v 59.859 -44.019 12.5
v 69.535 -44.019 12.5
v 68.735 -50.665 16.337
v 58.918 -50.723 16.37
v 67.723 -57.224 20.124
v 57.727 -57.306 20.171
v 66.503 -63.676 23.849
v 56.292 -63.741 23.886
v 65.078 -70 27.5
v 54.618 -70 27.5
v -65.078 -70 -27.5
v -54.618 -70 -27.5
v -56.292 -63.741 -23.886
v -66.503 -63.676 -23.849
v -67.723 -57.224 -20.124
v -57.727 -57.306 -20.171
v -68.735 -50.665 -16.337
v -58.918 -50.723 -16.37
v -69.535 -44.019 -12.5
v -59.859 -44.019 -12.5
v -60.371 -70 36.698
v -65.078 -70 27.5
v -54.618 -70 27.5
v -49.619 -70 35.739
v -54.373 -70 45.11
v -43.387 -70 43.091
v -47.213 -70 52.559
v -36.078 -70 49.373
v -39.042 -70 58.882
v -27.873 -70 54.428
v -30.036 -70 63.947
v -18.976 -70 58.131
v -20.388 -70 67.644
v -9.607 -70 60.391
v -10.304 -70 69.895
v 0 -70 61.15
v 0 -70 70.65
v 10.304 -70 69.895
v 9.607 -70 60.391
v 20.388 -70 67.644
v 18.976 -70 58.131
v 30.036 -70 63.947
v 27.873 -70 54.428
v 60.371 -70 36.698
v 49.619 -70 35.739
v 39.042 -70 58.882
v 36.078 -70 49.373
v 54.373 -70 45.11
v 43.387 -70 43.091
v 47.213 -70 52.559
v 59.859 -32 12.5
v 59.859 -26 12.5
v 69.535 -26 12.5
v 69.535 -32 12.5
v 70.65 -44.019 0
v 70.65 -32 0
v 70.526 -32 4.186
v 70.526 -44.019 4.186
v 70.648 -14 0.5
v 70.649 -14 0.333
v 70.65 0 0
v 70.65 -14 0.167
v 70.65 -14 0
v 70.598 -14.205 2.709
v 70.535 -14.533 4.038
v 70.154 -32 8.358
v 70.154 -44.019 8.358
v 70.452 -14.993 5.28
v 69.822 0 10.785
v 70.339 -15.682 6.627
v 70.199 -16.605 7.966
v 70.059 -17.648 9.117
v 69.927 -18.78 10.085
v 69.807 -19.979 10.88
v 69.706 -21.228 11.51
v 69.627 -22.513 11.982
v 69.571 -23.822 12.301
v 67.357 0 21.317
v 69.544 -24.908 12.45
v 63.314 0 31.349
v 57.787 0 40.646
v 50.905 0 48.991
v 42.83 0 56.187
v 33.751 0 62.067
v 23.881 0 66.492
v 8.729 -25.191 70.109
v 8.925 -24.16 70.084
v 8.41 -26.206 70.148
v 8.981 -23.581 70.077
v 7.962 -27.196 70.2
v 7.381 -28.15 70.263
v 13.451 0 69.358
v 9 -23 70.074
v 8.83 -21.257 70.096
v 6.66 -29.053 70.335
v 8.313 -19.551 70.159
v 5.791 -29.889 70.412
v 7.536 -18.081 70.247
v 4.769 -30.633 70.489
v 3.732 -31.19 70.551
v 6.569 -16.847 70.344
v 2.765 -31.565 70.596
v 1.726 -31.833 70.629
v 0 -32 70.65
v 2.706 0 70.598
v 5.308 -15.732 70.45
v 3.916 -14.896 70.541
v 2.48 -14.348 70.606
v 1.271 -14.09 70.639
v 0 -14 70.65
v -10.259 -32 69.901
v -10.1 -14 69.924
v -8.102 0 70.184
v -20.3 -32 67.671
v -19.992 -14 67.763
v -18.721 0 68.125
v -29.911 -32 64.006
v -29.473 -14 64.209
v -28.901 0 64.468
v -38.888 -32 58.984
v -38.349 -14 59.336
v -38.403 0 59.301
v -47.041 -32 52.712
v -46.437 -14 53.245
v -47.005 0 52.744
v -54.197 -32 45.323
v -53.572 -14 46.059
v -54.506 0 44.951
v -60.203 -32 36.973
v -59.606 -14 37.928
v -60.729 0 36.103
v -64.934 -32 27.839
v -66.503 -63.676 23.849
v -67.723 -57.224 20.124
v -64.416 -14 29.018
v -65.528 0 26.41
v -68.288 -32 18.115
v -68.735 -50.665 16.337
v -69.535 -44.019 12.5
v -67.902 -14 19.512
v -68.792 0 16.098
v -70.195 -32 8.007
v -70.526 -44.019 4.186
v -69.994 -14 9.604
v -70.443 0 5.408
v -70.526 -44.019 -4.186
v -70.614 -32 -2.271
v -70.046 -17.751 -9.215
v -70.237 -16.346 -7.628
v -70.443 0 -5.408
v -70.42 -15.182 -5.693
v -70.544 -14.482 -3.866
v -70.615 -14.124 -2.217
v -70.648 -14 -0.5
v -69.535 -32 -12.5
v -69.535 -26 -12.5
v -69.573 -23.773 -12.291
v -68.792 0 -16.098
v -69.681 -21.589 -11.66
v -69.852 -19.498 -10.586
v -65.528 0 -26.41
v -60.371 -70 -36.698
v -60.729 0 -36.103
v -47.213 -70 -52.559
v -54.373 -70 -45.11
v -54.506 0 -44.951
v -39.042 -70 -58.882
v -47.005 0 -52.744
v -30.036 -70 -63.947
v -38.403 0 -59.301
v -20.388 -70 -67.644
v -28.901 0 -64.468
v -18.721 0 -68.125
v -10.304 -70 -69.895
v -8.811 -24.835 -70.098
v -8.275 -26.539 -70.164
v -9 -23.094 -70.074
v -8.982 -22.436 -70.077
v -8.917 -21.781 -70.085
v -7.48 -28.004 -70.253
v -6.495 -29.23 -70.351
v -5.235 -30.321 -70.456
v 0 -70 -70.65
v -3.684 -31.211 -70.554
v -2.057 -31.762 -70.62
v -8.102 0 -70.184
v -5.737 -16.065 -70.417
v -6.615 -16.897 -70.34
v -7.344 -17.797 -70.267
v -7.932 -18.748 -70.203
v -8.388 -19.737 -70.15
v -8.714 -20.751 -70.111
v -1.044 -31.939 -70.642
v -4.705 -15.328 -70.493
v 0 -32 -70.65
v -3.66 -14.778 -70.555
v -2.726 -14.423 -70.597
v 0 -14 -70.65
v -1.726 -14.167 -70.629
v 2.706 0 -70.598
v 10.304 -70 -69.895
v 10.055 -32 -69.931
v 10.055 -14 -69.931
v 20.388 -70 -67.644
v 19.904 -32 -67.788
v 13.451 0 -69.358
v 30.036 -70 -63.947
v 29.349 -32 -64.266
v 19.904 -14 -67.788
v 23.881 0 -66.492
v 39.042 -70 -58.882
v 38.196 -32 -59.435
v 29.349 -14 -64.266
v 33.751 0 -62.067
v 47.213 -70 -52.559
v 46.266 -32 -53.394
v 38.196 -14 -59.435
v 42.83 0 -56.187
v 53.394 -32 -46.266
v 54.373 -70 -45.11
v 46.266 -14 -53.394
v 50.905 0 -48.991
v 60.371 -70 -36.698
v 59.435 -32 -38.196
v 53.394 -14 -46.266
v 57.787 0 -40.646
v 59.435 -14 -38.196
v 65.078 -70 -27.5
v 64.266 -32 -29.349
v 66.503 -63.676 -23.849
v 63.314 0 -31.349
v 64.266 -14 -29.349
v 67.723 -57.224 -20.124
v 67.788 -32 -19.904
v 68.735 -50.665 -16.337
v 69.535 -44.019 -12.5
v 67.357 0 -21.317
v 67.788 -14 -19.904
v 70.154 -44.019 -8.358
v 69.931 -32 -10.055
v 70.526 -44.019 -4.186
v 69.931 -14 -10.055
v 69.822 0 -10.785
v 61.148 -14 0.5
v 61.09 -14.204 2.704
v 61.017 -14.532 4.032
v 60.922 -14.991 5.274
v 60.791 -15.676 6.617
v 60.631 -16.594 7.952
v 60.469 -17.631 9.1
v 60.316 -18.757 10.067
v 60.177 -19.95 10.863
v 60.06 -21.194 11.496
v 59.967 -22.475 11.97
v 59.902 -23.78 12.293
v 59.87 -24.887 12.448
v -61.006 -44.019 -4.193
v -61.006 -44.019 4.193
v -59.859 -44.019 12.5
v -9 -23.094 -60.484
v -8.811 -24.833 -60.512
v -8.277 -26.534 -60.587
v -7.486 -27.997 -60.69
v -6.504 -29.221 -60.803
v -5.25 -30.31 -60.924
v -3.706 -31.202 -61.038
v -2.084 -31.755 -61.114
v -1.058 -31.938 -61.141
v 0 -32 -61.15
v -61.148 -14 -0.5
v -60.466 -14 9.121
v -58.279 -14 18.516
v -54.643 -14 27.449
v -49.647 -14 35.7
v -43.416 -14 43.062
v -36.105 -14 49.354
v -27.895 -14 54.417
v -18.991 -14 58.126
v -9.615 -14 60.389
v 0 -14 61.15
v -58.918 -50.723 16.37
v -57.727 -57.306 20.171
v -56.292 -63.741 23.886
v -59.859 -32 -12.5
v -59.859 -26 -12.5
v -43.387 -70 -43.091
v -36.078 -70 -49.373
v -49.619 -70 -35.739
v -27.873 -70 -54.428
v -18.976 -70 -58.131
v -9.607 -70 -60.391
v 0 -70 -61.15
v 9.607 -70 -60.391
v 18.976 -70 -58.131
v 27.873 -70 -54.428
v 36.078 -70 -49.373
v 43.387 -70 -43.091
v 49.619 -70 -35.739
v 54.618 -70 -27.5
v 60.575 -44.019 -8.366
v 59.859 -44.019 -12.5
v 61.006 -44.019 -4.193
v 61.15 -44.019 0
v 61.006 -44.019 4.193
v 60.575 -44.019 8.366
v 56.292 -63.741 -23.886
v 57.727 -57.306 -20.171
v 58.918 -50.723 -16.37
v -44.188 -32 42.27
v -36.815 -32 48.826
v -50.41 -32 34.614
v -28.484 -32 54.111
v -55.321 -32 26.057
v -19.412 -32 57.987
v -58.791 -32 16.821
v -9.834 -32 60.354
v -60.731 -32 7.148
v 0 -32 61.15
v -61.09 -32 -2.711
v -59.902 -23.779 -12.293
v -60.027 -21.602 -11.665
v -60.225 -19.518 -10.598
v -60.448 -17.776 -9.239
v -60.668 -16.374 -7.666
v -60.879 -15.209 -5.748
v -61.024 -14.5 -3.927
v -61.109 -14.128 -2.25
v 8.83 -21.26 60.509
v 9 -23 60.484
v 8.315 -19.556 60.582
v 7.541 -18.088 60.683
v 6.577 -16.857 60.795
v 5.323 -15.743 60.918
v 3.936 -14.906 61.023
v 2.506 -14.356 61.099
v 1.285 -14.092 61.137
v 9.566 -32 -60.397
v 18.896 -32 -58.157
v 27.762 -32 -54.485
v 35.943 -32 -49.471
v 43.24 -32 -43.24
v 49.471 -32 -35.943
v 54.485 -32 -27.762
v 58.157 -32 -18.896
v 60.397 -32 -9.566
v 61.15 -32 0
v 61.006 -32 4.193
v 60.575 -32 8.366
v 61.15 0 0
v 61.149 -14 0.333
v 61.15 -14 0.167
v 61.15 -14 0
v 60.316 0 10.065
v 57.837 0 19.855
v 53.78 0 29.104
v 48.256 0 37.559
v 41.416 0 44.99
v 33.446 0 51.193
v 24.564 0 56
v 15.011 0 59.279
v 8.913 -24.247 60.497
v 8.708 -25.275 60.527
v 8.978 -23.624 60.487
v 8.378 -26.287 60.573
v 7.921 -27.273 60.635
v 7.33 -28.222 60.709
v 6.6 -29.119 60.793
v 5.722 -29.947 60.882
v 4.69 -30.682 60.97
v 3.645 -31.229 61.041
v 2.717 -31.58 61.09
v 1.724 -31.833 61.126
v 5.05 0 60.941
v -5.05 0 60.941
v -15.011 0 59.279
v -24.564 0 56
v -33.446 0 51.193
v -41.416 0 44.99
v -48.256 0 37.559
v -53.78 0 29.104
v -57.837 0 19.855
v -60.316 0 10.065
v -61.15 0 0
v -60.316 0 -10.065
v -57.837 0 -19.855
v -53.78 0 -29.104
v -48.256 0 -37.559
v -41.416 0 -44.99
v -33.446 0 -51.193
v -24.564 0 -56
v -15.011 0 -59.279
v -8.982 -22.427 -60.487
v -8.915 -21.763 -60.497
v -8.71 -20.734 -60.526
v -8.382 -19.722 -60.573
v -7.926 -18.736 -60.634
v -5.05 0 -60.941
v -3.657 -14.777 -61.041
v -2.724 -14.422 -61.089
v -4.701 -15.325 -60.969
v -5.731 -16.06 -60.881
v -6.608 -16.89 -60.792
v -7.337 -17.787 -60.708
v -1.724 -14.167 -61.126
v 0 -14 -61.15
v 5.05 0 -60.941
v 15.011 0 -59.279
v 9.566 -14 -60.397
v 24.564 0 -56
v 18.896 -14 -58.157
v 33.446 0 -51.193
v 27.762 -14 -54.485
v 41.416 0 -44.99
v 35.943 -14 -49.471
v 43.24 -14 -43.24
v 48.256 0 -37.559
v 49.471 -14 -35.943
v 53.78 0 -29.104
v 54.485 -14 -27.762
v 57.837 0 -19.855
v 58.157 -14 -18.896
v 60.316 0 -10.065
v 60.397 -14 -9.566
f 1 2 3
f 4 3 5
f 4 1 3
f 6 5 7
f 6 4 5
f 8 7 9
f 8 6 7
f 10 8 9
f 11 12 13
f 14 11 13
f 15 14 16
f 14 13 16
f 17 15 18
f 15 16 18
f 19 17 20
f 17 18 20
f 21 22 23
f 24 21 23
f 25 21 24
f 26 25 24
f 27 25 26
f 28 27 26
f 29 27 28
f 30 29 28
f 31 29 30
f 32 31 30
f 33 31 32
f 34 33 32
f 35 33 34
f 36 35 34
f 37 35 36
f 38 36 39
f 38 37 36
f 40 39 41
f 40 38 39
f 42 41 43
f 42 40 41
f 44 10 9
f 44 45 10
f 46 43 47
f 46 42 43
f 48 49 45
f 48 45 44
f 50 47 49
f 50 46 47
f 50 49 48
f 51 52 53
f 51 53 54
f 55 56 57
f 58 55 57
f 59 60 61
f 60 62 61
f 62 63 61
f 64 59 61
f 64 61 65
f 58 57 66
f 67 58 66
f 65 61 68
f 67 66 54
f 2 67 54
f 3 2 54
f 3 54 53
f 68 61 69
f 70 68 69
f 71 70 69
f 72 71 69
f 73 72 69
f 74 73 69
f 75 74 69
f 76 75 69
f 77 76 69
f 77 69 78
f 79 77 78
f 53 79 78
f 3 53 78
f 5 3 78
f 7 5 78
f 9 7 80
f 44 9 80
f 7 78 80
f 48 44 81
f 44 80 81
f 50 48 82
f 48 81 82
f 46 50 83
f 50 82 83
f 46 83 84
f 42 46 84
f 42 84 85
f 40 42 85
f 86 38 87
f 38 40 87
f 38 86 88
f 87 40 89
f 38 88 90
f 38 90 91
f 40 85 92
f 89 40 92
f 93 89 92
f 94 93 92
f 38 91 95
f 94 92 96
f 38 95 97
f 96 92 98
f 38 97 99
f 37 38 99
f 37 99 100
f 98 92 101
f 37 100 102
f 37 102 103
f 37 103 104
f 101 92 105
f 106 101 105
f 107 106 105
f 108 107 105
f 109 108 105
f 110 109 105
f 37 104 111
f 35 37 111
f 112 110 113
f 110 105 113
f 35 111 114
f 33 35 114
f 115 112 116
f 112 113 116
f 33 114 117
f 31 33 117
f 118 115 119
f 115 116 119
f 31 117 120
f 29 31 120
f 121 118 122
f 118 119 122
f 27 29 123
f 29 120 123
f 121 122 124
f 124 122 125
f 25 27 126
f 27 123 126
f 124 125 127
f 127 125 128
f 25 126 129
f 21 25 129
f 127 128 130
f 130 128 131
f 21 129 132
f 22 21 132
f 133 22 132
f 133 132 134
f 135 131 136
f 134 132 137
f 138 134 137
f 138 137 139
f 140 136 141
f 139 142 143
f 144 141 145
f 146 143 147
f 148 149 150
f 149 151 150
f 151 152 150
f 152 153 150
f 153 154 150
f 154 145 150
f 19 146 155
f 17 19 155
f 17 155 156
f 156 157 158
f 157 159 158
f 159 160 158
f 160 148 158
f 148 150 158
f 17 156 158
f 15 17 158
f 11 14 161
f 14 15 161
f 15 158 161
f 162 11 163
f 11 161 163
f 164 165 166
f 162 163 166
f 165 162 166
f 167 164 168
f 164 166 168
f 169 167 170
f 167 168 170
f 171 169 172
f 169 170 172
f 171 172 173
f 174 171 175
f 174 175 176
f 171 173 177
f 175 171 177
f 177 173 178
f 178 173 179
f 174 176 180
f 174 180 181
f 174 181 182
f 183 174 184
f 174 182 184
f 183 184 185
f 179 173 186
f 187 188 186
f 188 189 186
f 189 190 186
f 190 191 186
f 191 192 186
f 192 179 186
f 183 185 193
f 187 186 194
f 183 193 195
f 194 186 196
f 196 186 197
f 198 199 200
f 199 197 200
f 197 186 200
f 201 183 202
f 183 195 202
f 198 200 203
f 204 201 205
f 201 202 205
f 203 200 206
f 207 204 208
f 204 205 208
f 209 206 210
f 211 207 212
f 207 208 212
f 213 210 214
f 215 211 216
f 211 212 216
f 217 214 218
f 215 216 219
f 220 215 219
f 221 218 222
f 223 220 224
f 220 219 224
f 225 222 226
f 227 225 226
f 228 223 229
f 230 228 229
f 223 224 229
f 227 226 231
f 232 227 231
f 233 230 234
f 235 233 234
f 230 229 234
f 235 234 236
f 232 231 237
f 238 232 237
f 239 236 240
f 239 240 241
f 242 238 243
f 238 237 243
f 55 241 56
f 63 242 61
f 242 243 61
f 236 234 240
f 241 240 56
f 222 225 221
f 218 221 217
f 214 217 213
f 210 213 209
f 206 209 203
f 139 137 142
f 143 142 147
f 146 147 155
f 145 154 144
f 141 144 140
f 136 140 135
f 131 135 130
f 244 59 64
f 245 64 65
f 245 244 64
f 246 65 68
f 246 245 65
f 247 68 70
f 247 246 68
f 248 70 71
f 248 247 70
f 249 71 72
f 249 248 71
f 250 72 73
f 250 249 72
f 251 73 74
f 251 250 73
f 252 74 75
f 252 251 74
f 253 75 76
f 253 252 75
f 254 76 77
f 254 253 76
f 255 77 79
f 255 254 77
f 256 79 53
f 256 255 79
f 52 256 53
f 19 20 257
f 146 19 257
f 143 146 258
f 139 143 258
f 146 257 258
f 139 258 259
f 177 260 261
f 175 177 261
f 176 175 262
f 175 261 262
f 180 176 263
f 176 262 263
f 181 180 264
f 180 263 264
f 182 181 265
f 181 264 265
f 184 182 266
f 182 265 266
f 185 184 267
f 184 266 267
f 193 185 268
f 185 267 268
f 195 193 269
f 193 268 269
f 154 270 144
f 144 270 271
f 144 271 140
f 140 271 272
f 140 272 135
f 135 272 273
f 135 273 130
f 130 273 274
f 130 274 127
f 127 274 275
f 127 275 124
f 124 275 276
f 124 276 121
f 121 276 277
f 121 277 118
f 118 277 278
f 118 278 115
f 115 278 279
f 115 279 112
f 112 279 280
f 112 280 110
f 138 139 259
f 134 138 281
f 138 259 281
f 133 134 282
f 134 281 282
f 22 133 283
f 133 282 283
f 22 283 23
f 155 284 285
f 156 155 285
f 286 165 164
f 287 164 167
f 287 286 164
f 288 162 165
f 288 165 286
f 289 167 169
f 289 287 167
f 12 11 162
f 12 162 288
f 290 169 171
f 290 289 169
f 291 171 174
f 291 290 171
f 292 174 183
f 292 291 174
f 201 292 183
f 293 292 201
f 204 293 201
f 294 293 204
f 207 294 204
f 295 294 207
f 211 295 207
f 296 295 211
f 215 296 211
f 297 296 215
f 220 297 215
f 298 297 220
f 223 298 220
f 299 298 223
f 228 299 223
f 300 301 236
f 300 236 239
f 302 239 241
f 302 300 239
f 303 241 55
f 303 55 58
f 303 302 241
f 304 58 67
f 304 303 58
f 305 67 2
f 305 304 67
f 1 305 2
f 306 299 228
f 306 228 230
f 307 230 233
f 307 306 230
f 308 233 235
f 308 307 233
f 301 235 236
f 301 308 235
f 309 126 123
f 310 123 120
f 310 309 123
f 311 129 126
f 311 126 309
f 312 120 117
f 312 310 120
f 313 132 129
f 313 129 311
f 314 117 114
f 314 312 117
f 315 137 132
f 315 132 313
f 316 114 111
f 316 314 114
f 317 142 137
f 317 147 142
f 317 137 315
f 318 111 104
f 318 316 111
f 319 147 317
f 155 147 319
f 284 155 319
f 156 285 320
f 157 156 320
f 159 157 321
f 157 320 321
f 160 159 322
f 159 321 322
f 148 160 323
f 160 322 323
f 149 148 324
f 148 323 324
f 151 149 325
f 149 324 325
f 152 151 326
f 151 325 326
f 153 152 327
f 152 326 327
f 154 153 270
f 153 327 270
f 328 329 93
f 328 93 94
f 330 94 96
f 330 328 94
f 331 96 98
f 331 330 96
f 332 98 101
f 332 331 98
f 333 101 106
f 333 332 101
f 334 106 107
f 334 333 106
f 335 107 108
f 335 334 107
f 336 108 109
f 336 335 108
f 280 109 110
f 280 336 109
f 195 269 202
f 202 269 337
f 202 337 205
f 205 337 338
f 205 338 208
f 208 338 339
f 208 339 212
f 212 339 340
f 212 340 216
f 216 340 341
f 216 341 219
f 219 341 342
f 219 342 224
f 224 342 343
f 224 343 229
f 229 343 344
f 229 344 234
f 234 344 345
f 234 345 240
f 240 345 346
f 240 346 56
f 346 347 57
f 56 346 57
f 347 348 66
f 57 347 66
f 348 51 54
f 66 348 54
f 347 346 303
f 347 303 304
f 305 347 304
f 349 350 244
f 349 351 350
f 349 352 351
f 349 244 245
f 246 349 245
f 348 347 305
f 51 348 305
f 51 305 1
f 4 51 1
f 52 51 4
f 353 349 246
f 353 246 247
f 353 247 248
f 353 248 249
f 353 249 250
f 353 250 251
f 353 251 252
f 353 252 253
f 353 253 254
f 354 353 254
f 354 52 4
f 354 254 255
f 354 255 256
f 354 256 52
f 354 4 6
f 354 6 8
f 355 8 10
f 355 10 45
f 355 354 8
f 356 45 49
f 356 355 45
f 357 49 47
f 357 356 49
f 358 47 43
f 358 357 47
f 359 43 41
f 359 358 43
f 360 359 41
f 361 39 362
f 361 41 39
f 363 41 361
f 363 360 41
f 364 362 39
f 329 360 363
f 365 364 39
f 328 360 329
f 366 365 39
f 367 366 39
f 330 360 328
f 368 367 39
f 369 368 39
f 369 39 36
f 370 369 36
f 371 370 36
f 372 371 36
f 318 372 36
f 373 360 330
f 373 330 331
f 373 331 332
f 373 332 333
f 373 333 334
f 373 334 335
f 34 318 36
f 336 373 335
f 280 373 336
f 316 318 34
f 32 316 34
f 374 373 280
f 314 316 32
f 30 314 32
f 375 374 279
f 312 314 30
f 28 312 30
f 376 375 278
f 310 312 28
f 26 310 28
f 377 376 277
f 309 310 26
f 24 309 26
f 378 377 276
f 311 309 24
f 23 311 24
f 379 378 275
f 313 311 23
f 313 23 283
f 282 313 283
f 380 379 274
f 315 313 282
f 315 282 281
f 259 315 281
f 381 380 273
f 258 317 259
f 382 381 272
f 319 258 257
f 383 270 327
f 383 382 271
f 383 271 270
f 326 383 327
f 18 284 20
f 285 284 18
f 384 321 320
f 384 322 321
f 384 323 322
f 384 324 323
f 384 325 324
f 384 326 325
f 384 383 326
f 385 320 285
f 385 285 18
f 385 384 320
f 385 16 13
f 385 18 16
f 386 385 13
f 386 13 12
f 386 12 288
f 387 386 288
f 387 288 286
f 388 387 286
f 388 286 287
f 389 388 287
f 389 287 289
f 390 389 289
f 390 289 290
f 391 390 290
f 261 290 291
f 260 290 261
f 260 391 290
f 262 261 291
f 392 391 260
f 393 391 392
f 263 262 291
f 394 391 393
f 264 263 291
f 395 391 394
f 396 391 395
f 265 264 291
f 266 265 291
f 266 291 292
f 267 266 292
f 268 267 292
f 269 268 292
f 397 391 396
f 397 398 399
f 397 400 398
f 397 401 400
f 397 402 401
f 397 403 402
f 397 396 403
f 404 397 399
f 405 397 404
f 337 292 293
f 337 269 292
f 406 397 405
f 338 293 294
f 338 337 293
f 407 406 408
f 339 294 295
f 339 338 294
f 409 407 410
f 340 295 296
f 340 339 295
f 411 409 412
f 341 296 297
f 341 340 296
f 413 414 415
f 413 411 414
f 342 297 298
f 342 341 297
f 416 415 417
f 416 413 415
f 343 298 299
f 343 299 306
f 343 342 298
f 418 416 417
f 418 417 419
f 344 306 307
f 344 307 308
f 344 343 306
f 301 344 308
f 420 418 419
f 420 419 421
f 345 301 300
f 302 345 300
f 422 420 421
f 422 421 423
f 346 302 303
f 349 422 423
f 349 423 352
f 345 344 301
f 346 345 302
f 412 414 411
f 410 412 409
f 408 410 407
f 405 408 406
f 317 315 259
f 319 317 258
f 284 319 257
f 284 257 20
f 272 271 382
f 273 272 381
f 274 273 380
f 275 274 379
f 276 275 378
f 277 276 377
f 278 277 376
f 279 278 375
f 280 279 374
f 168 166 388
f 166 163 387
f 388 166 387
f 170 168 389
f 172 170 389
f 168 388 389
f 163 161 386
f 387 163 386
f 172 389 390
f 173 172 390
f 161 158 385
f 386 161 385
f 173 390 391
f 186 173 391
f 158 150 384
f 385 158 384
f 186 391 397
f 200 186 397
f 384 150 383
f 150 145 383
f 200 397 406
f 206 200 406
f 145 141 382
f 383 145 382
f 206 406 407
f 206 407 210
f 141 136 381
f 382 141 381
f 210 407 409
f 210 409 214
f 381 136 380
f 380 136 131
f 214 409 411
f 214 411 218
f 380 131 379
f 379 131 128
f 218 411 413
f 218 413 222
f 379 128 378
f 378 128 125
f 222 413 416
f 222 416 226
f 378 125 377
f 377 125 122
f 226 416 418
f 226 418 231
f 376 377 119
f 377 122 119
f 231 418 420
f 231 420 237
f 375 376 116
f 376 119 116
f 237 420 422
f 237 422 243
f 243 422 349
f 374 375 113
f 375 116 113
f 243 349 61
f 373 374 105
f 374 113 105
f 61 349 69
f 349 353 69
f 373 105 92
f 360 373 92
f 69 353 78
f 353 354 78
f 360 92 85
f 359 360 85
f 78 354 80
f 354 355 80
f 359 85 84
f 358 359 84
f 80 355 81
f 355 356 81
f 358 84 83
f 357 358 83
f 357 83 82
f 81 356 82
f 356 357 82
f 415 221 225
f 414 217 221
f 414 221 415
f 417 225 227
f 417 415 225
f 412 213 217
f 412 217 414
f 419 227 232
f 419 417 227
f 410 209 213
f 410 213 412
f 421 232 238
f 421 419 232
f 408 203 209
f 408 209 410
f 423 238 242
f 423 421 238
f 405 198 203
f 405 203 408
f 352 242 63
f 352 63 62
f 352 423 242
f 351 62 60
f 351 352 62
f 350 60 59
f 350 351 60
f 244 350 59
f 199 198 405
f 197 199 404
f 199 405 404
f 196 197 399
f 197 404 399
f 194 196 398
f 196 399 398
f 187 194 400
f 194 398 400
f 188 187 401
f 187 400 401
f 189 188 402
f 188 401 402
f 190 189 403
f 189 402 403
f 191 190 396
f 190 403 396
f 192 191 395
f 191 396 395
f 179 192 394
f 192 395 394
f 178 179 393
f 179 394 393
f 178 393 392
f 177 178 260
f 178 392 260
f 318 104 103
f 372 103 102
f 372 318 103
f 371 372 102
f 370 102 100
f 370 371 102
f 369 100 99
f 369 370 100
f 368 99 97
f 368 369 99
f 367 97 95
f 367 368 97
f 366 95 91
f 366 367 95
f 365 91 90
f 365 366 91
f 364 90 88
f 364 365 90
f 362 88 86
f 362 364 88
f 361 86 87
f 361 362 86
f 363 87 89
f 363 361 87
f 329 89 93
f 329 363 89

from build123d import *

# Parameters (mm, degrees)
F0_R          = 70.65
F1_DEPTH      = 70
F2_T          = -9.5
F4_DEPTH      = 70.651
F4_DEPTH_BACK = 70.651
F6_DEPTH      = 70.6510001
F8_DEPTH      = 70.6510001


with BuildPart() as f1:
    # F0 (on Front) → F1 (new body)
    with BuildSketch(Plane.XZ):
        Circle(F0_R)
    extrude(amount=F1_DEPTH)

    # F2
    f2_openings = [f1.faces().sort_by_distance(p)[0] for p in [
        (0, -70, 0),
        (0, 0, 0),
    ]]
    offset(amount=F2_T, openings=f2_openings)

    # F3 (on Right) → F4 (cut, two sides)
    with BuildSketch(Plane.YZ) as f4_sk:
        with BuildLine():
            Line((-26, 12.5), (-32, 12.5))
            Line((-32, 12.5), (-32, -12.5))
            Line((-32, -12.5), (-26, -12.5))
            ThreePointArc((-26, -12.5), (-17.5147186258, -8.9852813742), (-14, -0.5))
            Line((-14, -0.5), (-14, 0.5))
            ThreePointArc((-14, 0.5), (-17.5147186258, 8.9852813742), (-26, 12.5))
        make_face()
        Polygon((-70, 27.5), (-70, 12.5), (-70, -12.5), (-70, -27.5), (-44.0192378865, -12.5), (-44.0192378865, 12.5), align=None)
    extrude(amount=-F4_DEPTH, mode=Mode.SUBTRACT)
    extrude(f4_sk.sketch, amount=F4_DEPTH_BACK, mode=Mode.SUBTRACT)

    # F5 (on Top) → F6 (cut, through all)
    with BuildSketch(Plane.XY):
        with BuildLine():
            ThreePointArc((-8.9995123916, -23.0936841124), (-6.3307520481, -29.3969976165), (0, -32))
            Line((0, -32), (79.6814696193, -32))
            Line((79.6814696193, -32), (79.6814696193, -14))
            Line((79.6814696193, -14), (0, -14))
            ThreePointArc((0, -14), (-6.3969976165, -16.6692479519), (-8.9995123916, -23.0936841124))
        make_face()
    extrude(amount=-F6_DEPTH, mode=Mode.SUBTRACT)

    # F7 (on Top) → F8 (cut, through all)
    with BuildSketch(Plane.XY):
        with BuildLine():
            Line((-108.6236870661, -32), (0, -32))
            ThreePointArc((0, -32), (6.3639610307, -29.3639610307), (9, -23))
            ThreePointArc((9, -23), (6.3639610307, -16.6360389693), (0, -14))
            Line((0, -14), (-108.6236870661, -14))
            Line((-108.6236870661, -14), (-108.6236870661, -32))
        make_face()
    extrude(amount=F8_DEPTH, mode=Mode.SUBTRACT)


solid = f1.part
